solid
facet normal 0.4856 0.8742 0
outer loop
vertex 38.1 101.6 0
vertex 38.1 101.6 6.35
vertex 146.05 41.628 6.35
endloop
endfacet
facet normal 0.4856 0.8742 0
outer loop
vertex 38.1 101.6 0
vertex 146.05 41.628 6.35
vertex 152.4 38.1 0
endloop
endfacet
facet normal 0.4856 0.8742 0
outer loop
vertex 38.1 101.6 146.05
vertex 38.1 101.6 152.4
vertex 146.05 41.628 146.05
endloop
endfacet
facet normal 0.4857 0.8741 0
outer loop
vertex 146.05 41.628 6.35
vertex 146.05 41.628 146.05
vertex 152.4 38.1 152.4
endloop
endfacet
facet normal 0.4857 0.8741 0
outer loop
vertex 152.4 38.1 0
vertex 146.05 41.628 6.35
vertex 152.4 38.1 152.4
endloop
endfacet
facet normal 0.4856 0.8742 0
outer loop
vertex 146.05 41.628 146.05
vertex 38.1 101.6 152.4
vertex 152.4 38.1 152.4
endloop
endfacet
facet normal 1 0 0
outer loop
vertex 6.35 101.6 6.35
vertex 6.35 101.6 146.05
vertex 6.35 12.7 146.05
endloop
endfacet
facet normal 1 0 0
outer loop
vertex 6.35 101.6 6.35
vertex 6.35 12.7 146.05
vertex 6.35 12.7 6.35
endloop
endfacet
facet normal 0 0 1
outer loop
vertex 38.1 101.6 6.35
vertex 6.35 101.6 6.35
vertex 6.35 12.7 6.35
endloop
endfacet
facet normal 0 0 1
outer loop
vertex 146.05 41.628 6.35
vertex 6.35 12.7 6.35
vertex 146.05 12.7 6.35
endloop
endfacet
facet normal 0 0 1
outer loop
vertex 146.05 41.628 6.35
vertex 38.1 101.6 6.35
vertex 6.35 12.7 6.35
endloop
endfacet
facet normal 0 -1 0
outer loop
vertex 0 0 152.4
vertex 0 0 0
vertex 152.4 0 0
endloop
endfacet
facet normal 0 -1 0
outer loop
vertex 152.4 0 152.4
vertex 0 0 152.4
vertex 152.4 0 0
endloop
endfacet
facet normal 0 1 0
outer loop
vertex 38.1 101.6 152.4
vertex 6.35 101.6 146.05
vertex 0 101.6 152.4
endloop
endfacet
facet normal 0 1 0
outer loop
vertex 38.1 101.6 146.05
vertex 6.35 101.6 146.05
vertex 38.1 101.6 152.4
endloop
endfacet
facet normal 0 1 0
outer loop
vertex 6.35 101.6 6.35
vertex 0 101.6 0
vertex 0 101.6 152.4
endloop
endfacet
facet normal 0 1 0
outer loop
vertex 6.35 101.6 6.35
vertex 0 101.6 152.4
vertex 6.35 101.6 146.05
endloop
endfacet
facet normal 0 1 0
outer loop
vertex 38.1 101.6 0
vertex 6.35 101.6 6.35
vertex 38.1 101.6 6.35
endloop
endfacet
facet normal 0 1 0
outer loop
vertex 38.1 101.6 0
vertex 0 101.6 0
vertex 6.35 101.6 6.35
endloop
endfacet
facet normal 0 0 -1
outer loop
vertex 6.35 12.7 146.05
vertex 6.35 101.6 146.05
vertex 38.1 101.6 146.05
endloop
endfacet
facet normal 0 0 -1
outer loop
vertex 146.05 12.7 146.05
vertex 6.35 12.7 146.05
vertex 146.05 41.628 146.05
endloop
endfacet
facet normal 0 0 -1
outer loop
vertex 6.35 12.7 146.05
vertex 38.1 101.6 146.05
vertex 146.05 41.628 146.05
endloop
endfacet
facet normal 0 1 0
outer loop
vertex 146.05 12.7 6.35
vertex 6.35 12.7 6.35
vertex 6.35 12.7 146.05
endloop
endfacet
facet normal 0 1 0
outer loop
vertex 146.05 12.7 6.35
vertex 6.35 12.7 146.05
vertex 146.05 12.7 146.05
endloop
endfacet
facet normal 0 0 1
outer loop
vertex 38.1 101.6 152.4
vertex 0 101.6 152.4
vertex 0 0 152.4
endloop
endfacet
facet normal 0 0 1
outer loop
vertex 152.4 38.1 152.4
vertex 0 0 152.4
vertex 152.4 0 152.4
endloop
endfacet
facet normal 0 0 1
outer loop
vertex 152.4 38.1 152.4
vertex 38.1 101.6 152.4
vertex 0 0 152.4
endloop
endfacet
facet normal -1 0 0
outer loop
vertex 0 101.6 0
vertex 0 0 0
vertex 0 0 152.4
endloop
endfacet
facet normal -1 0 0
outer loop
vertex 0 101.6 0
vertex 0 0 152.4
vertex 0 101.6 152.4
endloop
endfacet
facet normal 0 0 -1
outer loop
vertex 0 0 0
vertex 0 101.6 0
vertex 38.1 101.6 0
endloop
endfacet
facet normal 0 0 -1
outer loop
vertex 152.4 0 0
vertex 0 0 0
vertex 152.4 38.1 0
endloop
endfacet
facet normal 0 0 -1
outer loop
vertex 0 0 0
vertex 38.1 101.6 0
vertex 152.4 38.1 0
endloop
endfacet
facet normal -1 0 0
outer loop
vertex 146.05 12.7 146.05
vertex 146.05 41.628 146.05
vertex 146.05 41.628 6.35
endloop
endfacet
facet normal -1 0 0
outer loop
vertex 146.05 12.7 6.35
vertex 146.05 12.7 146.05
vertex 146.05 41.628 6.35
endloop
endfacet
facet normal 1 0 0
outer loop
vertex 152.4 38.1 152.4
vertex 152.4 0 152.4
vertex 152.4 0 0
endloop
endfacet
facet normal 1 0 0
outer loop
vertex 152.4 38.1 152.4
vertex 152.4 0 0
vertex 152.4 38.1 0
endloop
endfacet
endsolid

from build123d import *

# Parameters (mm, degrees)
SKETCH1_W           = 152.4
SKETCH1_H           = 101.6
BOSS_EXTRUDE1_DEPTH = 152.4
CUT_EXTRUDE2_DEPTH  = 152.4
SKETCH7_W           = 139.7
SKETCH7_H           = 139.7
CUT_EXTRUDE3_DEPTH  = 88.9


with BuildPart() as part:
    # Sketch1 → Boss-Extrude1 (new body)
    with BuildSketch(Plane.XY):
        with Locations((76.2, 50.8)):
            Rectangle(SKETCH1_W, SKETCH1_H)
    extrude(amount=BOSS_EXTRUDE1_DEPTH)

    # Sketch6 → Cut-Extrude2 (cut)
    with BuildSketch(Plane.XY.offset(152.4)):
        Polygon((104.436678767, 101.6), (38.1, 101.6), (152.4, 38.1), (152.4, 101.6), (104.590197544, 101.6), align=None)
    extrude(amount=-CUT_EXTRUDE2_DEPTH, mode=Mode.SUBTRACT)

    # Sketch7 → Cut-Extrude3 (cut)
    with BuildSketch(Plane(origin=(0, 101.6, 0), x_dir=(1, 0, 0), z_dir=(0, 1, 0))):
        with Locations((76.2, -76.2)):
            Rectangle(SKETCH7_W, SKETCH7_H)
    extrude(amount=-CUT_EXTRUDE3_DEPTH, mode=Mode.SUBTRACT)


solid = part.part
